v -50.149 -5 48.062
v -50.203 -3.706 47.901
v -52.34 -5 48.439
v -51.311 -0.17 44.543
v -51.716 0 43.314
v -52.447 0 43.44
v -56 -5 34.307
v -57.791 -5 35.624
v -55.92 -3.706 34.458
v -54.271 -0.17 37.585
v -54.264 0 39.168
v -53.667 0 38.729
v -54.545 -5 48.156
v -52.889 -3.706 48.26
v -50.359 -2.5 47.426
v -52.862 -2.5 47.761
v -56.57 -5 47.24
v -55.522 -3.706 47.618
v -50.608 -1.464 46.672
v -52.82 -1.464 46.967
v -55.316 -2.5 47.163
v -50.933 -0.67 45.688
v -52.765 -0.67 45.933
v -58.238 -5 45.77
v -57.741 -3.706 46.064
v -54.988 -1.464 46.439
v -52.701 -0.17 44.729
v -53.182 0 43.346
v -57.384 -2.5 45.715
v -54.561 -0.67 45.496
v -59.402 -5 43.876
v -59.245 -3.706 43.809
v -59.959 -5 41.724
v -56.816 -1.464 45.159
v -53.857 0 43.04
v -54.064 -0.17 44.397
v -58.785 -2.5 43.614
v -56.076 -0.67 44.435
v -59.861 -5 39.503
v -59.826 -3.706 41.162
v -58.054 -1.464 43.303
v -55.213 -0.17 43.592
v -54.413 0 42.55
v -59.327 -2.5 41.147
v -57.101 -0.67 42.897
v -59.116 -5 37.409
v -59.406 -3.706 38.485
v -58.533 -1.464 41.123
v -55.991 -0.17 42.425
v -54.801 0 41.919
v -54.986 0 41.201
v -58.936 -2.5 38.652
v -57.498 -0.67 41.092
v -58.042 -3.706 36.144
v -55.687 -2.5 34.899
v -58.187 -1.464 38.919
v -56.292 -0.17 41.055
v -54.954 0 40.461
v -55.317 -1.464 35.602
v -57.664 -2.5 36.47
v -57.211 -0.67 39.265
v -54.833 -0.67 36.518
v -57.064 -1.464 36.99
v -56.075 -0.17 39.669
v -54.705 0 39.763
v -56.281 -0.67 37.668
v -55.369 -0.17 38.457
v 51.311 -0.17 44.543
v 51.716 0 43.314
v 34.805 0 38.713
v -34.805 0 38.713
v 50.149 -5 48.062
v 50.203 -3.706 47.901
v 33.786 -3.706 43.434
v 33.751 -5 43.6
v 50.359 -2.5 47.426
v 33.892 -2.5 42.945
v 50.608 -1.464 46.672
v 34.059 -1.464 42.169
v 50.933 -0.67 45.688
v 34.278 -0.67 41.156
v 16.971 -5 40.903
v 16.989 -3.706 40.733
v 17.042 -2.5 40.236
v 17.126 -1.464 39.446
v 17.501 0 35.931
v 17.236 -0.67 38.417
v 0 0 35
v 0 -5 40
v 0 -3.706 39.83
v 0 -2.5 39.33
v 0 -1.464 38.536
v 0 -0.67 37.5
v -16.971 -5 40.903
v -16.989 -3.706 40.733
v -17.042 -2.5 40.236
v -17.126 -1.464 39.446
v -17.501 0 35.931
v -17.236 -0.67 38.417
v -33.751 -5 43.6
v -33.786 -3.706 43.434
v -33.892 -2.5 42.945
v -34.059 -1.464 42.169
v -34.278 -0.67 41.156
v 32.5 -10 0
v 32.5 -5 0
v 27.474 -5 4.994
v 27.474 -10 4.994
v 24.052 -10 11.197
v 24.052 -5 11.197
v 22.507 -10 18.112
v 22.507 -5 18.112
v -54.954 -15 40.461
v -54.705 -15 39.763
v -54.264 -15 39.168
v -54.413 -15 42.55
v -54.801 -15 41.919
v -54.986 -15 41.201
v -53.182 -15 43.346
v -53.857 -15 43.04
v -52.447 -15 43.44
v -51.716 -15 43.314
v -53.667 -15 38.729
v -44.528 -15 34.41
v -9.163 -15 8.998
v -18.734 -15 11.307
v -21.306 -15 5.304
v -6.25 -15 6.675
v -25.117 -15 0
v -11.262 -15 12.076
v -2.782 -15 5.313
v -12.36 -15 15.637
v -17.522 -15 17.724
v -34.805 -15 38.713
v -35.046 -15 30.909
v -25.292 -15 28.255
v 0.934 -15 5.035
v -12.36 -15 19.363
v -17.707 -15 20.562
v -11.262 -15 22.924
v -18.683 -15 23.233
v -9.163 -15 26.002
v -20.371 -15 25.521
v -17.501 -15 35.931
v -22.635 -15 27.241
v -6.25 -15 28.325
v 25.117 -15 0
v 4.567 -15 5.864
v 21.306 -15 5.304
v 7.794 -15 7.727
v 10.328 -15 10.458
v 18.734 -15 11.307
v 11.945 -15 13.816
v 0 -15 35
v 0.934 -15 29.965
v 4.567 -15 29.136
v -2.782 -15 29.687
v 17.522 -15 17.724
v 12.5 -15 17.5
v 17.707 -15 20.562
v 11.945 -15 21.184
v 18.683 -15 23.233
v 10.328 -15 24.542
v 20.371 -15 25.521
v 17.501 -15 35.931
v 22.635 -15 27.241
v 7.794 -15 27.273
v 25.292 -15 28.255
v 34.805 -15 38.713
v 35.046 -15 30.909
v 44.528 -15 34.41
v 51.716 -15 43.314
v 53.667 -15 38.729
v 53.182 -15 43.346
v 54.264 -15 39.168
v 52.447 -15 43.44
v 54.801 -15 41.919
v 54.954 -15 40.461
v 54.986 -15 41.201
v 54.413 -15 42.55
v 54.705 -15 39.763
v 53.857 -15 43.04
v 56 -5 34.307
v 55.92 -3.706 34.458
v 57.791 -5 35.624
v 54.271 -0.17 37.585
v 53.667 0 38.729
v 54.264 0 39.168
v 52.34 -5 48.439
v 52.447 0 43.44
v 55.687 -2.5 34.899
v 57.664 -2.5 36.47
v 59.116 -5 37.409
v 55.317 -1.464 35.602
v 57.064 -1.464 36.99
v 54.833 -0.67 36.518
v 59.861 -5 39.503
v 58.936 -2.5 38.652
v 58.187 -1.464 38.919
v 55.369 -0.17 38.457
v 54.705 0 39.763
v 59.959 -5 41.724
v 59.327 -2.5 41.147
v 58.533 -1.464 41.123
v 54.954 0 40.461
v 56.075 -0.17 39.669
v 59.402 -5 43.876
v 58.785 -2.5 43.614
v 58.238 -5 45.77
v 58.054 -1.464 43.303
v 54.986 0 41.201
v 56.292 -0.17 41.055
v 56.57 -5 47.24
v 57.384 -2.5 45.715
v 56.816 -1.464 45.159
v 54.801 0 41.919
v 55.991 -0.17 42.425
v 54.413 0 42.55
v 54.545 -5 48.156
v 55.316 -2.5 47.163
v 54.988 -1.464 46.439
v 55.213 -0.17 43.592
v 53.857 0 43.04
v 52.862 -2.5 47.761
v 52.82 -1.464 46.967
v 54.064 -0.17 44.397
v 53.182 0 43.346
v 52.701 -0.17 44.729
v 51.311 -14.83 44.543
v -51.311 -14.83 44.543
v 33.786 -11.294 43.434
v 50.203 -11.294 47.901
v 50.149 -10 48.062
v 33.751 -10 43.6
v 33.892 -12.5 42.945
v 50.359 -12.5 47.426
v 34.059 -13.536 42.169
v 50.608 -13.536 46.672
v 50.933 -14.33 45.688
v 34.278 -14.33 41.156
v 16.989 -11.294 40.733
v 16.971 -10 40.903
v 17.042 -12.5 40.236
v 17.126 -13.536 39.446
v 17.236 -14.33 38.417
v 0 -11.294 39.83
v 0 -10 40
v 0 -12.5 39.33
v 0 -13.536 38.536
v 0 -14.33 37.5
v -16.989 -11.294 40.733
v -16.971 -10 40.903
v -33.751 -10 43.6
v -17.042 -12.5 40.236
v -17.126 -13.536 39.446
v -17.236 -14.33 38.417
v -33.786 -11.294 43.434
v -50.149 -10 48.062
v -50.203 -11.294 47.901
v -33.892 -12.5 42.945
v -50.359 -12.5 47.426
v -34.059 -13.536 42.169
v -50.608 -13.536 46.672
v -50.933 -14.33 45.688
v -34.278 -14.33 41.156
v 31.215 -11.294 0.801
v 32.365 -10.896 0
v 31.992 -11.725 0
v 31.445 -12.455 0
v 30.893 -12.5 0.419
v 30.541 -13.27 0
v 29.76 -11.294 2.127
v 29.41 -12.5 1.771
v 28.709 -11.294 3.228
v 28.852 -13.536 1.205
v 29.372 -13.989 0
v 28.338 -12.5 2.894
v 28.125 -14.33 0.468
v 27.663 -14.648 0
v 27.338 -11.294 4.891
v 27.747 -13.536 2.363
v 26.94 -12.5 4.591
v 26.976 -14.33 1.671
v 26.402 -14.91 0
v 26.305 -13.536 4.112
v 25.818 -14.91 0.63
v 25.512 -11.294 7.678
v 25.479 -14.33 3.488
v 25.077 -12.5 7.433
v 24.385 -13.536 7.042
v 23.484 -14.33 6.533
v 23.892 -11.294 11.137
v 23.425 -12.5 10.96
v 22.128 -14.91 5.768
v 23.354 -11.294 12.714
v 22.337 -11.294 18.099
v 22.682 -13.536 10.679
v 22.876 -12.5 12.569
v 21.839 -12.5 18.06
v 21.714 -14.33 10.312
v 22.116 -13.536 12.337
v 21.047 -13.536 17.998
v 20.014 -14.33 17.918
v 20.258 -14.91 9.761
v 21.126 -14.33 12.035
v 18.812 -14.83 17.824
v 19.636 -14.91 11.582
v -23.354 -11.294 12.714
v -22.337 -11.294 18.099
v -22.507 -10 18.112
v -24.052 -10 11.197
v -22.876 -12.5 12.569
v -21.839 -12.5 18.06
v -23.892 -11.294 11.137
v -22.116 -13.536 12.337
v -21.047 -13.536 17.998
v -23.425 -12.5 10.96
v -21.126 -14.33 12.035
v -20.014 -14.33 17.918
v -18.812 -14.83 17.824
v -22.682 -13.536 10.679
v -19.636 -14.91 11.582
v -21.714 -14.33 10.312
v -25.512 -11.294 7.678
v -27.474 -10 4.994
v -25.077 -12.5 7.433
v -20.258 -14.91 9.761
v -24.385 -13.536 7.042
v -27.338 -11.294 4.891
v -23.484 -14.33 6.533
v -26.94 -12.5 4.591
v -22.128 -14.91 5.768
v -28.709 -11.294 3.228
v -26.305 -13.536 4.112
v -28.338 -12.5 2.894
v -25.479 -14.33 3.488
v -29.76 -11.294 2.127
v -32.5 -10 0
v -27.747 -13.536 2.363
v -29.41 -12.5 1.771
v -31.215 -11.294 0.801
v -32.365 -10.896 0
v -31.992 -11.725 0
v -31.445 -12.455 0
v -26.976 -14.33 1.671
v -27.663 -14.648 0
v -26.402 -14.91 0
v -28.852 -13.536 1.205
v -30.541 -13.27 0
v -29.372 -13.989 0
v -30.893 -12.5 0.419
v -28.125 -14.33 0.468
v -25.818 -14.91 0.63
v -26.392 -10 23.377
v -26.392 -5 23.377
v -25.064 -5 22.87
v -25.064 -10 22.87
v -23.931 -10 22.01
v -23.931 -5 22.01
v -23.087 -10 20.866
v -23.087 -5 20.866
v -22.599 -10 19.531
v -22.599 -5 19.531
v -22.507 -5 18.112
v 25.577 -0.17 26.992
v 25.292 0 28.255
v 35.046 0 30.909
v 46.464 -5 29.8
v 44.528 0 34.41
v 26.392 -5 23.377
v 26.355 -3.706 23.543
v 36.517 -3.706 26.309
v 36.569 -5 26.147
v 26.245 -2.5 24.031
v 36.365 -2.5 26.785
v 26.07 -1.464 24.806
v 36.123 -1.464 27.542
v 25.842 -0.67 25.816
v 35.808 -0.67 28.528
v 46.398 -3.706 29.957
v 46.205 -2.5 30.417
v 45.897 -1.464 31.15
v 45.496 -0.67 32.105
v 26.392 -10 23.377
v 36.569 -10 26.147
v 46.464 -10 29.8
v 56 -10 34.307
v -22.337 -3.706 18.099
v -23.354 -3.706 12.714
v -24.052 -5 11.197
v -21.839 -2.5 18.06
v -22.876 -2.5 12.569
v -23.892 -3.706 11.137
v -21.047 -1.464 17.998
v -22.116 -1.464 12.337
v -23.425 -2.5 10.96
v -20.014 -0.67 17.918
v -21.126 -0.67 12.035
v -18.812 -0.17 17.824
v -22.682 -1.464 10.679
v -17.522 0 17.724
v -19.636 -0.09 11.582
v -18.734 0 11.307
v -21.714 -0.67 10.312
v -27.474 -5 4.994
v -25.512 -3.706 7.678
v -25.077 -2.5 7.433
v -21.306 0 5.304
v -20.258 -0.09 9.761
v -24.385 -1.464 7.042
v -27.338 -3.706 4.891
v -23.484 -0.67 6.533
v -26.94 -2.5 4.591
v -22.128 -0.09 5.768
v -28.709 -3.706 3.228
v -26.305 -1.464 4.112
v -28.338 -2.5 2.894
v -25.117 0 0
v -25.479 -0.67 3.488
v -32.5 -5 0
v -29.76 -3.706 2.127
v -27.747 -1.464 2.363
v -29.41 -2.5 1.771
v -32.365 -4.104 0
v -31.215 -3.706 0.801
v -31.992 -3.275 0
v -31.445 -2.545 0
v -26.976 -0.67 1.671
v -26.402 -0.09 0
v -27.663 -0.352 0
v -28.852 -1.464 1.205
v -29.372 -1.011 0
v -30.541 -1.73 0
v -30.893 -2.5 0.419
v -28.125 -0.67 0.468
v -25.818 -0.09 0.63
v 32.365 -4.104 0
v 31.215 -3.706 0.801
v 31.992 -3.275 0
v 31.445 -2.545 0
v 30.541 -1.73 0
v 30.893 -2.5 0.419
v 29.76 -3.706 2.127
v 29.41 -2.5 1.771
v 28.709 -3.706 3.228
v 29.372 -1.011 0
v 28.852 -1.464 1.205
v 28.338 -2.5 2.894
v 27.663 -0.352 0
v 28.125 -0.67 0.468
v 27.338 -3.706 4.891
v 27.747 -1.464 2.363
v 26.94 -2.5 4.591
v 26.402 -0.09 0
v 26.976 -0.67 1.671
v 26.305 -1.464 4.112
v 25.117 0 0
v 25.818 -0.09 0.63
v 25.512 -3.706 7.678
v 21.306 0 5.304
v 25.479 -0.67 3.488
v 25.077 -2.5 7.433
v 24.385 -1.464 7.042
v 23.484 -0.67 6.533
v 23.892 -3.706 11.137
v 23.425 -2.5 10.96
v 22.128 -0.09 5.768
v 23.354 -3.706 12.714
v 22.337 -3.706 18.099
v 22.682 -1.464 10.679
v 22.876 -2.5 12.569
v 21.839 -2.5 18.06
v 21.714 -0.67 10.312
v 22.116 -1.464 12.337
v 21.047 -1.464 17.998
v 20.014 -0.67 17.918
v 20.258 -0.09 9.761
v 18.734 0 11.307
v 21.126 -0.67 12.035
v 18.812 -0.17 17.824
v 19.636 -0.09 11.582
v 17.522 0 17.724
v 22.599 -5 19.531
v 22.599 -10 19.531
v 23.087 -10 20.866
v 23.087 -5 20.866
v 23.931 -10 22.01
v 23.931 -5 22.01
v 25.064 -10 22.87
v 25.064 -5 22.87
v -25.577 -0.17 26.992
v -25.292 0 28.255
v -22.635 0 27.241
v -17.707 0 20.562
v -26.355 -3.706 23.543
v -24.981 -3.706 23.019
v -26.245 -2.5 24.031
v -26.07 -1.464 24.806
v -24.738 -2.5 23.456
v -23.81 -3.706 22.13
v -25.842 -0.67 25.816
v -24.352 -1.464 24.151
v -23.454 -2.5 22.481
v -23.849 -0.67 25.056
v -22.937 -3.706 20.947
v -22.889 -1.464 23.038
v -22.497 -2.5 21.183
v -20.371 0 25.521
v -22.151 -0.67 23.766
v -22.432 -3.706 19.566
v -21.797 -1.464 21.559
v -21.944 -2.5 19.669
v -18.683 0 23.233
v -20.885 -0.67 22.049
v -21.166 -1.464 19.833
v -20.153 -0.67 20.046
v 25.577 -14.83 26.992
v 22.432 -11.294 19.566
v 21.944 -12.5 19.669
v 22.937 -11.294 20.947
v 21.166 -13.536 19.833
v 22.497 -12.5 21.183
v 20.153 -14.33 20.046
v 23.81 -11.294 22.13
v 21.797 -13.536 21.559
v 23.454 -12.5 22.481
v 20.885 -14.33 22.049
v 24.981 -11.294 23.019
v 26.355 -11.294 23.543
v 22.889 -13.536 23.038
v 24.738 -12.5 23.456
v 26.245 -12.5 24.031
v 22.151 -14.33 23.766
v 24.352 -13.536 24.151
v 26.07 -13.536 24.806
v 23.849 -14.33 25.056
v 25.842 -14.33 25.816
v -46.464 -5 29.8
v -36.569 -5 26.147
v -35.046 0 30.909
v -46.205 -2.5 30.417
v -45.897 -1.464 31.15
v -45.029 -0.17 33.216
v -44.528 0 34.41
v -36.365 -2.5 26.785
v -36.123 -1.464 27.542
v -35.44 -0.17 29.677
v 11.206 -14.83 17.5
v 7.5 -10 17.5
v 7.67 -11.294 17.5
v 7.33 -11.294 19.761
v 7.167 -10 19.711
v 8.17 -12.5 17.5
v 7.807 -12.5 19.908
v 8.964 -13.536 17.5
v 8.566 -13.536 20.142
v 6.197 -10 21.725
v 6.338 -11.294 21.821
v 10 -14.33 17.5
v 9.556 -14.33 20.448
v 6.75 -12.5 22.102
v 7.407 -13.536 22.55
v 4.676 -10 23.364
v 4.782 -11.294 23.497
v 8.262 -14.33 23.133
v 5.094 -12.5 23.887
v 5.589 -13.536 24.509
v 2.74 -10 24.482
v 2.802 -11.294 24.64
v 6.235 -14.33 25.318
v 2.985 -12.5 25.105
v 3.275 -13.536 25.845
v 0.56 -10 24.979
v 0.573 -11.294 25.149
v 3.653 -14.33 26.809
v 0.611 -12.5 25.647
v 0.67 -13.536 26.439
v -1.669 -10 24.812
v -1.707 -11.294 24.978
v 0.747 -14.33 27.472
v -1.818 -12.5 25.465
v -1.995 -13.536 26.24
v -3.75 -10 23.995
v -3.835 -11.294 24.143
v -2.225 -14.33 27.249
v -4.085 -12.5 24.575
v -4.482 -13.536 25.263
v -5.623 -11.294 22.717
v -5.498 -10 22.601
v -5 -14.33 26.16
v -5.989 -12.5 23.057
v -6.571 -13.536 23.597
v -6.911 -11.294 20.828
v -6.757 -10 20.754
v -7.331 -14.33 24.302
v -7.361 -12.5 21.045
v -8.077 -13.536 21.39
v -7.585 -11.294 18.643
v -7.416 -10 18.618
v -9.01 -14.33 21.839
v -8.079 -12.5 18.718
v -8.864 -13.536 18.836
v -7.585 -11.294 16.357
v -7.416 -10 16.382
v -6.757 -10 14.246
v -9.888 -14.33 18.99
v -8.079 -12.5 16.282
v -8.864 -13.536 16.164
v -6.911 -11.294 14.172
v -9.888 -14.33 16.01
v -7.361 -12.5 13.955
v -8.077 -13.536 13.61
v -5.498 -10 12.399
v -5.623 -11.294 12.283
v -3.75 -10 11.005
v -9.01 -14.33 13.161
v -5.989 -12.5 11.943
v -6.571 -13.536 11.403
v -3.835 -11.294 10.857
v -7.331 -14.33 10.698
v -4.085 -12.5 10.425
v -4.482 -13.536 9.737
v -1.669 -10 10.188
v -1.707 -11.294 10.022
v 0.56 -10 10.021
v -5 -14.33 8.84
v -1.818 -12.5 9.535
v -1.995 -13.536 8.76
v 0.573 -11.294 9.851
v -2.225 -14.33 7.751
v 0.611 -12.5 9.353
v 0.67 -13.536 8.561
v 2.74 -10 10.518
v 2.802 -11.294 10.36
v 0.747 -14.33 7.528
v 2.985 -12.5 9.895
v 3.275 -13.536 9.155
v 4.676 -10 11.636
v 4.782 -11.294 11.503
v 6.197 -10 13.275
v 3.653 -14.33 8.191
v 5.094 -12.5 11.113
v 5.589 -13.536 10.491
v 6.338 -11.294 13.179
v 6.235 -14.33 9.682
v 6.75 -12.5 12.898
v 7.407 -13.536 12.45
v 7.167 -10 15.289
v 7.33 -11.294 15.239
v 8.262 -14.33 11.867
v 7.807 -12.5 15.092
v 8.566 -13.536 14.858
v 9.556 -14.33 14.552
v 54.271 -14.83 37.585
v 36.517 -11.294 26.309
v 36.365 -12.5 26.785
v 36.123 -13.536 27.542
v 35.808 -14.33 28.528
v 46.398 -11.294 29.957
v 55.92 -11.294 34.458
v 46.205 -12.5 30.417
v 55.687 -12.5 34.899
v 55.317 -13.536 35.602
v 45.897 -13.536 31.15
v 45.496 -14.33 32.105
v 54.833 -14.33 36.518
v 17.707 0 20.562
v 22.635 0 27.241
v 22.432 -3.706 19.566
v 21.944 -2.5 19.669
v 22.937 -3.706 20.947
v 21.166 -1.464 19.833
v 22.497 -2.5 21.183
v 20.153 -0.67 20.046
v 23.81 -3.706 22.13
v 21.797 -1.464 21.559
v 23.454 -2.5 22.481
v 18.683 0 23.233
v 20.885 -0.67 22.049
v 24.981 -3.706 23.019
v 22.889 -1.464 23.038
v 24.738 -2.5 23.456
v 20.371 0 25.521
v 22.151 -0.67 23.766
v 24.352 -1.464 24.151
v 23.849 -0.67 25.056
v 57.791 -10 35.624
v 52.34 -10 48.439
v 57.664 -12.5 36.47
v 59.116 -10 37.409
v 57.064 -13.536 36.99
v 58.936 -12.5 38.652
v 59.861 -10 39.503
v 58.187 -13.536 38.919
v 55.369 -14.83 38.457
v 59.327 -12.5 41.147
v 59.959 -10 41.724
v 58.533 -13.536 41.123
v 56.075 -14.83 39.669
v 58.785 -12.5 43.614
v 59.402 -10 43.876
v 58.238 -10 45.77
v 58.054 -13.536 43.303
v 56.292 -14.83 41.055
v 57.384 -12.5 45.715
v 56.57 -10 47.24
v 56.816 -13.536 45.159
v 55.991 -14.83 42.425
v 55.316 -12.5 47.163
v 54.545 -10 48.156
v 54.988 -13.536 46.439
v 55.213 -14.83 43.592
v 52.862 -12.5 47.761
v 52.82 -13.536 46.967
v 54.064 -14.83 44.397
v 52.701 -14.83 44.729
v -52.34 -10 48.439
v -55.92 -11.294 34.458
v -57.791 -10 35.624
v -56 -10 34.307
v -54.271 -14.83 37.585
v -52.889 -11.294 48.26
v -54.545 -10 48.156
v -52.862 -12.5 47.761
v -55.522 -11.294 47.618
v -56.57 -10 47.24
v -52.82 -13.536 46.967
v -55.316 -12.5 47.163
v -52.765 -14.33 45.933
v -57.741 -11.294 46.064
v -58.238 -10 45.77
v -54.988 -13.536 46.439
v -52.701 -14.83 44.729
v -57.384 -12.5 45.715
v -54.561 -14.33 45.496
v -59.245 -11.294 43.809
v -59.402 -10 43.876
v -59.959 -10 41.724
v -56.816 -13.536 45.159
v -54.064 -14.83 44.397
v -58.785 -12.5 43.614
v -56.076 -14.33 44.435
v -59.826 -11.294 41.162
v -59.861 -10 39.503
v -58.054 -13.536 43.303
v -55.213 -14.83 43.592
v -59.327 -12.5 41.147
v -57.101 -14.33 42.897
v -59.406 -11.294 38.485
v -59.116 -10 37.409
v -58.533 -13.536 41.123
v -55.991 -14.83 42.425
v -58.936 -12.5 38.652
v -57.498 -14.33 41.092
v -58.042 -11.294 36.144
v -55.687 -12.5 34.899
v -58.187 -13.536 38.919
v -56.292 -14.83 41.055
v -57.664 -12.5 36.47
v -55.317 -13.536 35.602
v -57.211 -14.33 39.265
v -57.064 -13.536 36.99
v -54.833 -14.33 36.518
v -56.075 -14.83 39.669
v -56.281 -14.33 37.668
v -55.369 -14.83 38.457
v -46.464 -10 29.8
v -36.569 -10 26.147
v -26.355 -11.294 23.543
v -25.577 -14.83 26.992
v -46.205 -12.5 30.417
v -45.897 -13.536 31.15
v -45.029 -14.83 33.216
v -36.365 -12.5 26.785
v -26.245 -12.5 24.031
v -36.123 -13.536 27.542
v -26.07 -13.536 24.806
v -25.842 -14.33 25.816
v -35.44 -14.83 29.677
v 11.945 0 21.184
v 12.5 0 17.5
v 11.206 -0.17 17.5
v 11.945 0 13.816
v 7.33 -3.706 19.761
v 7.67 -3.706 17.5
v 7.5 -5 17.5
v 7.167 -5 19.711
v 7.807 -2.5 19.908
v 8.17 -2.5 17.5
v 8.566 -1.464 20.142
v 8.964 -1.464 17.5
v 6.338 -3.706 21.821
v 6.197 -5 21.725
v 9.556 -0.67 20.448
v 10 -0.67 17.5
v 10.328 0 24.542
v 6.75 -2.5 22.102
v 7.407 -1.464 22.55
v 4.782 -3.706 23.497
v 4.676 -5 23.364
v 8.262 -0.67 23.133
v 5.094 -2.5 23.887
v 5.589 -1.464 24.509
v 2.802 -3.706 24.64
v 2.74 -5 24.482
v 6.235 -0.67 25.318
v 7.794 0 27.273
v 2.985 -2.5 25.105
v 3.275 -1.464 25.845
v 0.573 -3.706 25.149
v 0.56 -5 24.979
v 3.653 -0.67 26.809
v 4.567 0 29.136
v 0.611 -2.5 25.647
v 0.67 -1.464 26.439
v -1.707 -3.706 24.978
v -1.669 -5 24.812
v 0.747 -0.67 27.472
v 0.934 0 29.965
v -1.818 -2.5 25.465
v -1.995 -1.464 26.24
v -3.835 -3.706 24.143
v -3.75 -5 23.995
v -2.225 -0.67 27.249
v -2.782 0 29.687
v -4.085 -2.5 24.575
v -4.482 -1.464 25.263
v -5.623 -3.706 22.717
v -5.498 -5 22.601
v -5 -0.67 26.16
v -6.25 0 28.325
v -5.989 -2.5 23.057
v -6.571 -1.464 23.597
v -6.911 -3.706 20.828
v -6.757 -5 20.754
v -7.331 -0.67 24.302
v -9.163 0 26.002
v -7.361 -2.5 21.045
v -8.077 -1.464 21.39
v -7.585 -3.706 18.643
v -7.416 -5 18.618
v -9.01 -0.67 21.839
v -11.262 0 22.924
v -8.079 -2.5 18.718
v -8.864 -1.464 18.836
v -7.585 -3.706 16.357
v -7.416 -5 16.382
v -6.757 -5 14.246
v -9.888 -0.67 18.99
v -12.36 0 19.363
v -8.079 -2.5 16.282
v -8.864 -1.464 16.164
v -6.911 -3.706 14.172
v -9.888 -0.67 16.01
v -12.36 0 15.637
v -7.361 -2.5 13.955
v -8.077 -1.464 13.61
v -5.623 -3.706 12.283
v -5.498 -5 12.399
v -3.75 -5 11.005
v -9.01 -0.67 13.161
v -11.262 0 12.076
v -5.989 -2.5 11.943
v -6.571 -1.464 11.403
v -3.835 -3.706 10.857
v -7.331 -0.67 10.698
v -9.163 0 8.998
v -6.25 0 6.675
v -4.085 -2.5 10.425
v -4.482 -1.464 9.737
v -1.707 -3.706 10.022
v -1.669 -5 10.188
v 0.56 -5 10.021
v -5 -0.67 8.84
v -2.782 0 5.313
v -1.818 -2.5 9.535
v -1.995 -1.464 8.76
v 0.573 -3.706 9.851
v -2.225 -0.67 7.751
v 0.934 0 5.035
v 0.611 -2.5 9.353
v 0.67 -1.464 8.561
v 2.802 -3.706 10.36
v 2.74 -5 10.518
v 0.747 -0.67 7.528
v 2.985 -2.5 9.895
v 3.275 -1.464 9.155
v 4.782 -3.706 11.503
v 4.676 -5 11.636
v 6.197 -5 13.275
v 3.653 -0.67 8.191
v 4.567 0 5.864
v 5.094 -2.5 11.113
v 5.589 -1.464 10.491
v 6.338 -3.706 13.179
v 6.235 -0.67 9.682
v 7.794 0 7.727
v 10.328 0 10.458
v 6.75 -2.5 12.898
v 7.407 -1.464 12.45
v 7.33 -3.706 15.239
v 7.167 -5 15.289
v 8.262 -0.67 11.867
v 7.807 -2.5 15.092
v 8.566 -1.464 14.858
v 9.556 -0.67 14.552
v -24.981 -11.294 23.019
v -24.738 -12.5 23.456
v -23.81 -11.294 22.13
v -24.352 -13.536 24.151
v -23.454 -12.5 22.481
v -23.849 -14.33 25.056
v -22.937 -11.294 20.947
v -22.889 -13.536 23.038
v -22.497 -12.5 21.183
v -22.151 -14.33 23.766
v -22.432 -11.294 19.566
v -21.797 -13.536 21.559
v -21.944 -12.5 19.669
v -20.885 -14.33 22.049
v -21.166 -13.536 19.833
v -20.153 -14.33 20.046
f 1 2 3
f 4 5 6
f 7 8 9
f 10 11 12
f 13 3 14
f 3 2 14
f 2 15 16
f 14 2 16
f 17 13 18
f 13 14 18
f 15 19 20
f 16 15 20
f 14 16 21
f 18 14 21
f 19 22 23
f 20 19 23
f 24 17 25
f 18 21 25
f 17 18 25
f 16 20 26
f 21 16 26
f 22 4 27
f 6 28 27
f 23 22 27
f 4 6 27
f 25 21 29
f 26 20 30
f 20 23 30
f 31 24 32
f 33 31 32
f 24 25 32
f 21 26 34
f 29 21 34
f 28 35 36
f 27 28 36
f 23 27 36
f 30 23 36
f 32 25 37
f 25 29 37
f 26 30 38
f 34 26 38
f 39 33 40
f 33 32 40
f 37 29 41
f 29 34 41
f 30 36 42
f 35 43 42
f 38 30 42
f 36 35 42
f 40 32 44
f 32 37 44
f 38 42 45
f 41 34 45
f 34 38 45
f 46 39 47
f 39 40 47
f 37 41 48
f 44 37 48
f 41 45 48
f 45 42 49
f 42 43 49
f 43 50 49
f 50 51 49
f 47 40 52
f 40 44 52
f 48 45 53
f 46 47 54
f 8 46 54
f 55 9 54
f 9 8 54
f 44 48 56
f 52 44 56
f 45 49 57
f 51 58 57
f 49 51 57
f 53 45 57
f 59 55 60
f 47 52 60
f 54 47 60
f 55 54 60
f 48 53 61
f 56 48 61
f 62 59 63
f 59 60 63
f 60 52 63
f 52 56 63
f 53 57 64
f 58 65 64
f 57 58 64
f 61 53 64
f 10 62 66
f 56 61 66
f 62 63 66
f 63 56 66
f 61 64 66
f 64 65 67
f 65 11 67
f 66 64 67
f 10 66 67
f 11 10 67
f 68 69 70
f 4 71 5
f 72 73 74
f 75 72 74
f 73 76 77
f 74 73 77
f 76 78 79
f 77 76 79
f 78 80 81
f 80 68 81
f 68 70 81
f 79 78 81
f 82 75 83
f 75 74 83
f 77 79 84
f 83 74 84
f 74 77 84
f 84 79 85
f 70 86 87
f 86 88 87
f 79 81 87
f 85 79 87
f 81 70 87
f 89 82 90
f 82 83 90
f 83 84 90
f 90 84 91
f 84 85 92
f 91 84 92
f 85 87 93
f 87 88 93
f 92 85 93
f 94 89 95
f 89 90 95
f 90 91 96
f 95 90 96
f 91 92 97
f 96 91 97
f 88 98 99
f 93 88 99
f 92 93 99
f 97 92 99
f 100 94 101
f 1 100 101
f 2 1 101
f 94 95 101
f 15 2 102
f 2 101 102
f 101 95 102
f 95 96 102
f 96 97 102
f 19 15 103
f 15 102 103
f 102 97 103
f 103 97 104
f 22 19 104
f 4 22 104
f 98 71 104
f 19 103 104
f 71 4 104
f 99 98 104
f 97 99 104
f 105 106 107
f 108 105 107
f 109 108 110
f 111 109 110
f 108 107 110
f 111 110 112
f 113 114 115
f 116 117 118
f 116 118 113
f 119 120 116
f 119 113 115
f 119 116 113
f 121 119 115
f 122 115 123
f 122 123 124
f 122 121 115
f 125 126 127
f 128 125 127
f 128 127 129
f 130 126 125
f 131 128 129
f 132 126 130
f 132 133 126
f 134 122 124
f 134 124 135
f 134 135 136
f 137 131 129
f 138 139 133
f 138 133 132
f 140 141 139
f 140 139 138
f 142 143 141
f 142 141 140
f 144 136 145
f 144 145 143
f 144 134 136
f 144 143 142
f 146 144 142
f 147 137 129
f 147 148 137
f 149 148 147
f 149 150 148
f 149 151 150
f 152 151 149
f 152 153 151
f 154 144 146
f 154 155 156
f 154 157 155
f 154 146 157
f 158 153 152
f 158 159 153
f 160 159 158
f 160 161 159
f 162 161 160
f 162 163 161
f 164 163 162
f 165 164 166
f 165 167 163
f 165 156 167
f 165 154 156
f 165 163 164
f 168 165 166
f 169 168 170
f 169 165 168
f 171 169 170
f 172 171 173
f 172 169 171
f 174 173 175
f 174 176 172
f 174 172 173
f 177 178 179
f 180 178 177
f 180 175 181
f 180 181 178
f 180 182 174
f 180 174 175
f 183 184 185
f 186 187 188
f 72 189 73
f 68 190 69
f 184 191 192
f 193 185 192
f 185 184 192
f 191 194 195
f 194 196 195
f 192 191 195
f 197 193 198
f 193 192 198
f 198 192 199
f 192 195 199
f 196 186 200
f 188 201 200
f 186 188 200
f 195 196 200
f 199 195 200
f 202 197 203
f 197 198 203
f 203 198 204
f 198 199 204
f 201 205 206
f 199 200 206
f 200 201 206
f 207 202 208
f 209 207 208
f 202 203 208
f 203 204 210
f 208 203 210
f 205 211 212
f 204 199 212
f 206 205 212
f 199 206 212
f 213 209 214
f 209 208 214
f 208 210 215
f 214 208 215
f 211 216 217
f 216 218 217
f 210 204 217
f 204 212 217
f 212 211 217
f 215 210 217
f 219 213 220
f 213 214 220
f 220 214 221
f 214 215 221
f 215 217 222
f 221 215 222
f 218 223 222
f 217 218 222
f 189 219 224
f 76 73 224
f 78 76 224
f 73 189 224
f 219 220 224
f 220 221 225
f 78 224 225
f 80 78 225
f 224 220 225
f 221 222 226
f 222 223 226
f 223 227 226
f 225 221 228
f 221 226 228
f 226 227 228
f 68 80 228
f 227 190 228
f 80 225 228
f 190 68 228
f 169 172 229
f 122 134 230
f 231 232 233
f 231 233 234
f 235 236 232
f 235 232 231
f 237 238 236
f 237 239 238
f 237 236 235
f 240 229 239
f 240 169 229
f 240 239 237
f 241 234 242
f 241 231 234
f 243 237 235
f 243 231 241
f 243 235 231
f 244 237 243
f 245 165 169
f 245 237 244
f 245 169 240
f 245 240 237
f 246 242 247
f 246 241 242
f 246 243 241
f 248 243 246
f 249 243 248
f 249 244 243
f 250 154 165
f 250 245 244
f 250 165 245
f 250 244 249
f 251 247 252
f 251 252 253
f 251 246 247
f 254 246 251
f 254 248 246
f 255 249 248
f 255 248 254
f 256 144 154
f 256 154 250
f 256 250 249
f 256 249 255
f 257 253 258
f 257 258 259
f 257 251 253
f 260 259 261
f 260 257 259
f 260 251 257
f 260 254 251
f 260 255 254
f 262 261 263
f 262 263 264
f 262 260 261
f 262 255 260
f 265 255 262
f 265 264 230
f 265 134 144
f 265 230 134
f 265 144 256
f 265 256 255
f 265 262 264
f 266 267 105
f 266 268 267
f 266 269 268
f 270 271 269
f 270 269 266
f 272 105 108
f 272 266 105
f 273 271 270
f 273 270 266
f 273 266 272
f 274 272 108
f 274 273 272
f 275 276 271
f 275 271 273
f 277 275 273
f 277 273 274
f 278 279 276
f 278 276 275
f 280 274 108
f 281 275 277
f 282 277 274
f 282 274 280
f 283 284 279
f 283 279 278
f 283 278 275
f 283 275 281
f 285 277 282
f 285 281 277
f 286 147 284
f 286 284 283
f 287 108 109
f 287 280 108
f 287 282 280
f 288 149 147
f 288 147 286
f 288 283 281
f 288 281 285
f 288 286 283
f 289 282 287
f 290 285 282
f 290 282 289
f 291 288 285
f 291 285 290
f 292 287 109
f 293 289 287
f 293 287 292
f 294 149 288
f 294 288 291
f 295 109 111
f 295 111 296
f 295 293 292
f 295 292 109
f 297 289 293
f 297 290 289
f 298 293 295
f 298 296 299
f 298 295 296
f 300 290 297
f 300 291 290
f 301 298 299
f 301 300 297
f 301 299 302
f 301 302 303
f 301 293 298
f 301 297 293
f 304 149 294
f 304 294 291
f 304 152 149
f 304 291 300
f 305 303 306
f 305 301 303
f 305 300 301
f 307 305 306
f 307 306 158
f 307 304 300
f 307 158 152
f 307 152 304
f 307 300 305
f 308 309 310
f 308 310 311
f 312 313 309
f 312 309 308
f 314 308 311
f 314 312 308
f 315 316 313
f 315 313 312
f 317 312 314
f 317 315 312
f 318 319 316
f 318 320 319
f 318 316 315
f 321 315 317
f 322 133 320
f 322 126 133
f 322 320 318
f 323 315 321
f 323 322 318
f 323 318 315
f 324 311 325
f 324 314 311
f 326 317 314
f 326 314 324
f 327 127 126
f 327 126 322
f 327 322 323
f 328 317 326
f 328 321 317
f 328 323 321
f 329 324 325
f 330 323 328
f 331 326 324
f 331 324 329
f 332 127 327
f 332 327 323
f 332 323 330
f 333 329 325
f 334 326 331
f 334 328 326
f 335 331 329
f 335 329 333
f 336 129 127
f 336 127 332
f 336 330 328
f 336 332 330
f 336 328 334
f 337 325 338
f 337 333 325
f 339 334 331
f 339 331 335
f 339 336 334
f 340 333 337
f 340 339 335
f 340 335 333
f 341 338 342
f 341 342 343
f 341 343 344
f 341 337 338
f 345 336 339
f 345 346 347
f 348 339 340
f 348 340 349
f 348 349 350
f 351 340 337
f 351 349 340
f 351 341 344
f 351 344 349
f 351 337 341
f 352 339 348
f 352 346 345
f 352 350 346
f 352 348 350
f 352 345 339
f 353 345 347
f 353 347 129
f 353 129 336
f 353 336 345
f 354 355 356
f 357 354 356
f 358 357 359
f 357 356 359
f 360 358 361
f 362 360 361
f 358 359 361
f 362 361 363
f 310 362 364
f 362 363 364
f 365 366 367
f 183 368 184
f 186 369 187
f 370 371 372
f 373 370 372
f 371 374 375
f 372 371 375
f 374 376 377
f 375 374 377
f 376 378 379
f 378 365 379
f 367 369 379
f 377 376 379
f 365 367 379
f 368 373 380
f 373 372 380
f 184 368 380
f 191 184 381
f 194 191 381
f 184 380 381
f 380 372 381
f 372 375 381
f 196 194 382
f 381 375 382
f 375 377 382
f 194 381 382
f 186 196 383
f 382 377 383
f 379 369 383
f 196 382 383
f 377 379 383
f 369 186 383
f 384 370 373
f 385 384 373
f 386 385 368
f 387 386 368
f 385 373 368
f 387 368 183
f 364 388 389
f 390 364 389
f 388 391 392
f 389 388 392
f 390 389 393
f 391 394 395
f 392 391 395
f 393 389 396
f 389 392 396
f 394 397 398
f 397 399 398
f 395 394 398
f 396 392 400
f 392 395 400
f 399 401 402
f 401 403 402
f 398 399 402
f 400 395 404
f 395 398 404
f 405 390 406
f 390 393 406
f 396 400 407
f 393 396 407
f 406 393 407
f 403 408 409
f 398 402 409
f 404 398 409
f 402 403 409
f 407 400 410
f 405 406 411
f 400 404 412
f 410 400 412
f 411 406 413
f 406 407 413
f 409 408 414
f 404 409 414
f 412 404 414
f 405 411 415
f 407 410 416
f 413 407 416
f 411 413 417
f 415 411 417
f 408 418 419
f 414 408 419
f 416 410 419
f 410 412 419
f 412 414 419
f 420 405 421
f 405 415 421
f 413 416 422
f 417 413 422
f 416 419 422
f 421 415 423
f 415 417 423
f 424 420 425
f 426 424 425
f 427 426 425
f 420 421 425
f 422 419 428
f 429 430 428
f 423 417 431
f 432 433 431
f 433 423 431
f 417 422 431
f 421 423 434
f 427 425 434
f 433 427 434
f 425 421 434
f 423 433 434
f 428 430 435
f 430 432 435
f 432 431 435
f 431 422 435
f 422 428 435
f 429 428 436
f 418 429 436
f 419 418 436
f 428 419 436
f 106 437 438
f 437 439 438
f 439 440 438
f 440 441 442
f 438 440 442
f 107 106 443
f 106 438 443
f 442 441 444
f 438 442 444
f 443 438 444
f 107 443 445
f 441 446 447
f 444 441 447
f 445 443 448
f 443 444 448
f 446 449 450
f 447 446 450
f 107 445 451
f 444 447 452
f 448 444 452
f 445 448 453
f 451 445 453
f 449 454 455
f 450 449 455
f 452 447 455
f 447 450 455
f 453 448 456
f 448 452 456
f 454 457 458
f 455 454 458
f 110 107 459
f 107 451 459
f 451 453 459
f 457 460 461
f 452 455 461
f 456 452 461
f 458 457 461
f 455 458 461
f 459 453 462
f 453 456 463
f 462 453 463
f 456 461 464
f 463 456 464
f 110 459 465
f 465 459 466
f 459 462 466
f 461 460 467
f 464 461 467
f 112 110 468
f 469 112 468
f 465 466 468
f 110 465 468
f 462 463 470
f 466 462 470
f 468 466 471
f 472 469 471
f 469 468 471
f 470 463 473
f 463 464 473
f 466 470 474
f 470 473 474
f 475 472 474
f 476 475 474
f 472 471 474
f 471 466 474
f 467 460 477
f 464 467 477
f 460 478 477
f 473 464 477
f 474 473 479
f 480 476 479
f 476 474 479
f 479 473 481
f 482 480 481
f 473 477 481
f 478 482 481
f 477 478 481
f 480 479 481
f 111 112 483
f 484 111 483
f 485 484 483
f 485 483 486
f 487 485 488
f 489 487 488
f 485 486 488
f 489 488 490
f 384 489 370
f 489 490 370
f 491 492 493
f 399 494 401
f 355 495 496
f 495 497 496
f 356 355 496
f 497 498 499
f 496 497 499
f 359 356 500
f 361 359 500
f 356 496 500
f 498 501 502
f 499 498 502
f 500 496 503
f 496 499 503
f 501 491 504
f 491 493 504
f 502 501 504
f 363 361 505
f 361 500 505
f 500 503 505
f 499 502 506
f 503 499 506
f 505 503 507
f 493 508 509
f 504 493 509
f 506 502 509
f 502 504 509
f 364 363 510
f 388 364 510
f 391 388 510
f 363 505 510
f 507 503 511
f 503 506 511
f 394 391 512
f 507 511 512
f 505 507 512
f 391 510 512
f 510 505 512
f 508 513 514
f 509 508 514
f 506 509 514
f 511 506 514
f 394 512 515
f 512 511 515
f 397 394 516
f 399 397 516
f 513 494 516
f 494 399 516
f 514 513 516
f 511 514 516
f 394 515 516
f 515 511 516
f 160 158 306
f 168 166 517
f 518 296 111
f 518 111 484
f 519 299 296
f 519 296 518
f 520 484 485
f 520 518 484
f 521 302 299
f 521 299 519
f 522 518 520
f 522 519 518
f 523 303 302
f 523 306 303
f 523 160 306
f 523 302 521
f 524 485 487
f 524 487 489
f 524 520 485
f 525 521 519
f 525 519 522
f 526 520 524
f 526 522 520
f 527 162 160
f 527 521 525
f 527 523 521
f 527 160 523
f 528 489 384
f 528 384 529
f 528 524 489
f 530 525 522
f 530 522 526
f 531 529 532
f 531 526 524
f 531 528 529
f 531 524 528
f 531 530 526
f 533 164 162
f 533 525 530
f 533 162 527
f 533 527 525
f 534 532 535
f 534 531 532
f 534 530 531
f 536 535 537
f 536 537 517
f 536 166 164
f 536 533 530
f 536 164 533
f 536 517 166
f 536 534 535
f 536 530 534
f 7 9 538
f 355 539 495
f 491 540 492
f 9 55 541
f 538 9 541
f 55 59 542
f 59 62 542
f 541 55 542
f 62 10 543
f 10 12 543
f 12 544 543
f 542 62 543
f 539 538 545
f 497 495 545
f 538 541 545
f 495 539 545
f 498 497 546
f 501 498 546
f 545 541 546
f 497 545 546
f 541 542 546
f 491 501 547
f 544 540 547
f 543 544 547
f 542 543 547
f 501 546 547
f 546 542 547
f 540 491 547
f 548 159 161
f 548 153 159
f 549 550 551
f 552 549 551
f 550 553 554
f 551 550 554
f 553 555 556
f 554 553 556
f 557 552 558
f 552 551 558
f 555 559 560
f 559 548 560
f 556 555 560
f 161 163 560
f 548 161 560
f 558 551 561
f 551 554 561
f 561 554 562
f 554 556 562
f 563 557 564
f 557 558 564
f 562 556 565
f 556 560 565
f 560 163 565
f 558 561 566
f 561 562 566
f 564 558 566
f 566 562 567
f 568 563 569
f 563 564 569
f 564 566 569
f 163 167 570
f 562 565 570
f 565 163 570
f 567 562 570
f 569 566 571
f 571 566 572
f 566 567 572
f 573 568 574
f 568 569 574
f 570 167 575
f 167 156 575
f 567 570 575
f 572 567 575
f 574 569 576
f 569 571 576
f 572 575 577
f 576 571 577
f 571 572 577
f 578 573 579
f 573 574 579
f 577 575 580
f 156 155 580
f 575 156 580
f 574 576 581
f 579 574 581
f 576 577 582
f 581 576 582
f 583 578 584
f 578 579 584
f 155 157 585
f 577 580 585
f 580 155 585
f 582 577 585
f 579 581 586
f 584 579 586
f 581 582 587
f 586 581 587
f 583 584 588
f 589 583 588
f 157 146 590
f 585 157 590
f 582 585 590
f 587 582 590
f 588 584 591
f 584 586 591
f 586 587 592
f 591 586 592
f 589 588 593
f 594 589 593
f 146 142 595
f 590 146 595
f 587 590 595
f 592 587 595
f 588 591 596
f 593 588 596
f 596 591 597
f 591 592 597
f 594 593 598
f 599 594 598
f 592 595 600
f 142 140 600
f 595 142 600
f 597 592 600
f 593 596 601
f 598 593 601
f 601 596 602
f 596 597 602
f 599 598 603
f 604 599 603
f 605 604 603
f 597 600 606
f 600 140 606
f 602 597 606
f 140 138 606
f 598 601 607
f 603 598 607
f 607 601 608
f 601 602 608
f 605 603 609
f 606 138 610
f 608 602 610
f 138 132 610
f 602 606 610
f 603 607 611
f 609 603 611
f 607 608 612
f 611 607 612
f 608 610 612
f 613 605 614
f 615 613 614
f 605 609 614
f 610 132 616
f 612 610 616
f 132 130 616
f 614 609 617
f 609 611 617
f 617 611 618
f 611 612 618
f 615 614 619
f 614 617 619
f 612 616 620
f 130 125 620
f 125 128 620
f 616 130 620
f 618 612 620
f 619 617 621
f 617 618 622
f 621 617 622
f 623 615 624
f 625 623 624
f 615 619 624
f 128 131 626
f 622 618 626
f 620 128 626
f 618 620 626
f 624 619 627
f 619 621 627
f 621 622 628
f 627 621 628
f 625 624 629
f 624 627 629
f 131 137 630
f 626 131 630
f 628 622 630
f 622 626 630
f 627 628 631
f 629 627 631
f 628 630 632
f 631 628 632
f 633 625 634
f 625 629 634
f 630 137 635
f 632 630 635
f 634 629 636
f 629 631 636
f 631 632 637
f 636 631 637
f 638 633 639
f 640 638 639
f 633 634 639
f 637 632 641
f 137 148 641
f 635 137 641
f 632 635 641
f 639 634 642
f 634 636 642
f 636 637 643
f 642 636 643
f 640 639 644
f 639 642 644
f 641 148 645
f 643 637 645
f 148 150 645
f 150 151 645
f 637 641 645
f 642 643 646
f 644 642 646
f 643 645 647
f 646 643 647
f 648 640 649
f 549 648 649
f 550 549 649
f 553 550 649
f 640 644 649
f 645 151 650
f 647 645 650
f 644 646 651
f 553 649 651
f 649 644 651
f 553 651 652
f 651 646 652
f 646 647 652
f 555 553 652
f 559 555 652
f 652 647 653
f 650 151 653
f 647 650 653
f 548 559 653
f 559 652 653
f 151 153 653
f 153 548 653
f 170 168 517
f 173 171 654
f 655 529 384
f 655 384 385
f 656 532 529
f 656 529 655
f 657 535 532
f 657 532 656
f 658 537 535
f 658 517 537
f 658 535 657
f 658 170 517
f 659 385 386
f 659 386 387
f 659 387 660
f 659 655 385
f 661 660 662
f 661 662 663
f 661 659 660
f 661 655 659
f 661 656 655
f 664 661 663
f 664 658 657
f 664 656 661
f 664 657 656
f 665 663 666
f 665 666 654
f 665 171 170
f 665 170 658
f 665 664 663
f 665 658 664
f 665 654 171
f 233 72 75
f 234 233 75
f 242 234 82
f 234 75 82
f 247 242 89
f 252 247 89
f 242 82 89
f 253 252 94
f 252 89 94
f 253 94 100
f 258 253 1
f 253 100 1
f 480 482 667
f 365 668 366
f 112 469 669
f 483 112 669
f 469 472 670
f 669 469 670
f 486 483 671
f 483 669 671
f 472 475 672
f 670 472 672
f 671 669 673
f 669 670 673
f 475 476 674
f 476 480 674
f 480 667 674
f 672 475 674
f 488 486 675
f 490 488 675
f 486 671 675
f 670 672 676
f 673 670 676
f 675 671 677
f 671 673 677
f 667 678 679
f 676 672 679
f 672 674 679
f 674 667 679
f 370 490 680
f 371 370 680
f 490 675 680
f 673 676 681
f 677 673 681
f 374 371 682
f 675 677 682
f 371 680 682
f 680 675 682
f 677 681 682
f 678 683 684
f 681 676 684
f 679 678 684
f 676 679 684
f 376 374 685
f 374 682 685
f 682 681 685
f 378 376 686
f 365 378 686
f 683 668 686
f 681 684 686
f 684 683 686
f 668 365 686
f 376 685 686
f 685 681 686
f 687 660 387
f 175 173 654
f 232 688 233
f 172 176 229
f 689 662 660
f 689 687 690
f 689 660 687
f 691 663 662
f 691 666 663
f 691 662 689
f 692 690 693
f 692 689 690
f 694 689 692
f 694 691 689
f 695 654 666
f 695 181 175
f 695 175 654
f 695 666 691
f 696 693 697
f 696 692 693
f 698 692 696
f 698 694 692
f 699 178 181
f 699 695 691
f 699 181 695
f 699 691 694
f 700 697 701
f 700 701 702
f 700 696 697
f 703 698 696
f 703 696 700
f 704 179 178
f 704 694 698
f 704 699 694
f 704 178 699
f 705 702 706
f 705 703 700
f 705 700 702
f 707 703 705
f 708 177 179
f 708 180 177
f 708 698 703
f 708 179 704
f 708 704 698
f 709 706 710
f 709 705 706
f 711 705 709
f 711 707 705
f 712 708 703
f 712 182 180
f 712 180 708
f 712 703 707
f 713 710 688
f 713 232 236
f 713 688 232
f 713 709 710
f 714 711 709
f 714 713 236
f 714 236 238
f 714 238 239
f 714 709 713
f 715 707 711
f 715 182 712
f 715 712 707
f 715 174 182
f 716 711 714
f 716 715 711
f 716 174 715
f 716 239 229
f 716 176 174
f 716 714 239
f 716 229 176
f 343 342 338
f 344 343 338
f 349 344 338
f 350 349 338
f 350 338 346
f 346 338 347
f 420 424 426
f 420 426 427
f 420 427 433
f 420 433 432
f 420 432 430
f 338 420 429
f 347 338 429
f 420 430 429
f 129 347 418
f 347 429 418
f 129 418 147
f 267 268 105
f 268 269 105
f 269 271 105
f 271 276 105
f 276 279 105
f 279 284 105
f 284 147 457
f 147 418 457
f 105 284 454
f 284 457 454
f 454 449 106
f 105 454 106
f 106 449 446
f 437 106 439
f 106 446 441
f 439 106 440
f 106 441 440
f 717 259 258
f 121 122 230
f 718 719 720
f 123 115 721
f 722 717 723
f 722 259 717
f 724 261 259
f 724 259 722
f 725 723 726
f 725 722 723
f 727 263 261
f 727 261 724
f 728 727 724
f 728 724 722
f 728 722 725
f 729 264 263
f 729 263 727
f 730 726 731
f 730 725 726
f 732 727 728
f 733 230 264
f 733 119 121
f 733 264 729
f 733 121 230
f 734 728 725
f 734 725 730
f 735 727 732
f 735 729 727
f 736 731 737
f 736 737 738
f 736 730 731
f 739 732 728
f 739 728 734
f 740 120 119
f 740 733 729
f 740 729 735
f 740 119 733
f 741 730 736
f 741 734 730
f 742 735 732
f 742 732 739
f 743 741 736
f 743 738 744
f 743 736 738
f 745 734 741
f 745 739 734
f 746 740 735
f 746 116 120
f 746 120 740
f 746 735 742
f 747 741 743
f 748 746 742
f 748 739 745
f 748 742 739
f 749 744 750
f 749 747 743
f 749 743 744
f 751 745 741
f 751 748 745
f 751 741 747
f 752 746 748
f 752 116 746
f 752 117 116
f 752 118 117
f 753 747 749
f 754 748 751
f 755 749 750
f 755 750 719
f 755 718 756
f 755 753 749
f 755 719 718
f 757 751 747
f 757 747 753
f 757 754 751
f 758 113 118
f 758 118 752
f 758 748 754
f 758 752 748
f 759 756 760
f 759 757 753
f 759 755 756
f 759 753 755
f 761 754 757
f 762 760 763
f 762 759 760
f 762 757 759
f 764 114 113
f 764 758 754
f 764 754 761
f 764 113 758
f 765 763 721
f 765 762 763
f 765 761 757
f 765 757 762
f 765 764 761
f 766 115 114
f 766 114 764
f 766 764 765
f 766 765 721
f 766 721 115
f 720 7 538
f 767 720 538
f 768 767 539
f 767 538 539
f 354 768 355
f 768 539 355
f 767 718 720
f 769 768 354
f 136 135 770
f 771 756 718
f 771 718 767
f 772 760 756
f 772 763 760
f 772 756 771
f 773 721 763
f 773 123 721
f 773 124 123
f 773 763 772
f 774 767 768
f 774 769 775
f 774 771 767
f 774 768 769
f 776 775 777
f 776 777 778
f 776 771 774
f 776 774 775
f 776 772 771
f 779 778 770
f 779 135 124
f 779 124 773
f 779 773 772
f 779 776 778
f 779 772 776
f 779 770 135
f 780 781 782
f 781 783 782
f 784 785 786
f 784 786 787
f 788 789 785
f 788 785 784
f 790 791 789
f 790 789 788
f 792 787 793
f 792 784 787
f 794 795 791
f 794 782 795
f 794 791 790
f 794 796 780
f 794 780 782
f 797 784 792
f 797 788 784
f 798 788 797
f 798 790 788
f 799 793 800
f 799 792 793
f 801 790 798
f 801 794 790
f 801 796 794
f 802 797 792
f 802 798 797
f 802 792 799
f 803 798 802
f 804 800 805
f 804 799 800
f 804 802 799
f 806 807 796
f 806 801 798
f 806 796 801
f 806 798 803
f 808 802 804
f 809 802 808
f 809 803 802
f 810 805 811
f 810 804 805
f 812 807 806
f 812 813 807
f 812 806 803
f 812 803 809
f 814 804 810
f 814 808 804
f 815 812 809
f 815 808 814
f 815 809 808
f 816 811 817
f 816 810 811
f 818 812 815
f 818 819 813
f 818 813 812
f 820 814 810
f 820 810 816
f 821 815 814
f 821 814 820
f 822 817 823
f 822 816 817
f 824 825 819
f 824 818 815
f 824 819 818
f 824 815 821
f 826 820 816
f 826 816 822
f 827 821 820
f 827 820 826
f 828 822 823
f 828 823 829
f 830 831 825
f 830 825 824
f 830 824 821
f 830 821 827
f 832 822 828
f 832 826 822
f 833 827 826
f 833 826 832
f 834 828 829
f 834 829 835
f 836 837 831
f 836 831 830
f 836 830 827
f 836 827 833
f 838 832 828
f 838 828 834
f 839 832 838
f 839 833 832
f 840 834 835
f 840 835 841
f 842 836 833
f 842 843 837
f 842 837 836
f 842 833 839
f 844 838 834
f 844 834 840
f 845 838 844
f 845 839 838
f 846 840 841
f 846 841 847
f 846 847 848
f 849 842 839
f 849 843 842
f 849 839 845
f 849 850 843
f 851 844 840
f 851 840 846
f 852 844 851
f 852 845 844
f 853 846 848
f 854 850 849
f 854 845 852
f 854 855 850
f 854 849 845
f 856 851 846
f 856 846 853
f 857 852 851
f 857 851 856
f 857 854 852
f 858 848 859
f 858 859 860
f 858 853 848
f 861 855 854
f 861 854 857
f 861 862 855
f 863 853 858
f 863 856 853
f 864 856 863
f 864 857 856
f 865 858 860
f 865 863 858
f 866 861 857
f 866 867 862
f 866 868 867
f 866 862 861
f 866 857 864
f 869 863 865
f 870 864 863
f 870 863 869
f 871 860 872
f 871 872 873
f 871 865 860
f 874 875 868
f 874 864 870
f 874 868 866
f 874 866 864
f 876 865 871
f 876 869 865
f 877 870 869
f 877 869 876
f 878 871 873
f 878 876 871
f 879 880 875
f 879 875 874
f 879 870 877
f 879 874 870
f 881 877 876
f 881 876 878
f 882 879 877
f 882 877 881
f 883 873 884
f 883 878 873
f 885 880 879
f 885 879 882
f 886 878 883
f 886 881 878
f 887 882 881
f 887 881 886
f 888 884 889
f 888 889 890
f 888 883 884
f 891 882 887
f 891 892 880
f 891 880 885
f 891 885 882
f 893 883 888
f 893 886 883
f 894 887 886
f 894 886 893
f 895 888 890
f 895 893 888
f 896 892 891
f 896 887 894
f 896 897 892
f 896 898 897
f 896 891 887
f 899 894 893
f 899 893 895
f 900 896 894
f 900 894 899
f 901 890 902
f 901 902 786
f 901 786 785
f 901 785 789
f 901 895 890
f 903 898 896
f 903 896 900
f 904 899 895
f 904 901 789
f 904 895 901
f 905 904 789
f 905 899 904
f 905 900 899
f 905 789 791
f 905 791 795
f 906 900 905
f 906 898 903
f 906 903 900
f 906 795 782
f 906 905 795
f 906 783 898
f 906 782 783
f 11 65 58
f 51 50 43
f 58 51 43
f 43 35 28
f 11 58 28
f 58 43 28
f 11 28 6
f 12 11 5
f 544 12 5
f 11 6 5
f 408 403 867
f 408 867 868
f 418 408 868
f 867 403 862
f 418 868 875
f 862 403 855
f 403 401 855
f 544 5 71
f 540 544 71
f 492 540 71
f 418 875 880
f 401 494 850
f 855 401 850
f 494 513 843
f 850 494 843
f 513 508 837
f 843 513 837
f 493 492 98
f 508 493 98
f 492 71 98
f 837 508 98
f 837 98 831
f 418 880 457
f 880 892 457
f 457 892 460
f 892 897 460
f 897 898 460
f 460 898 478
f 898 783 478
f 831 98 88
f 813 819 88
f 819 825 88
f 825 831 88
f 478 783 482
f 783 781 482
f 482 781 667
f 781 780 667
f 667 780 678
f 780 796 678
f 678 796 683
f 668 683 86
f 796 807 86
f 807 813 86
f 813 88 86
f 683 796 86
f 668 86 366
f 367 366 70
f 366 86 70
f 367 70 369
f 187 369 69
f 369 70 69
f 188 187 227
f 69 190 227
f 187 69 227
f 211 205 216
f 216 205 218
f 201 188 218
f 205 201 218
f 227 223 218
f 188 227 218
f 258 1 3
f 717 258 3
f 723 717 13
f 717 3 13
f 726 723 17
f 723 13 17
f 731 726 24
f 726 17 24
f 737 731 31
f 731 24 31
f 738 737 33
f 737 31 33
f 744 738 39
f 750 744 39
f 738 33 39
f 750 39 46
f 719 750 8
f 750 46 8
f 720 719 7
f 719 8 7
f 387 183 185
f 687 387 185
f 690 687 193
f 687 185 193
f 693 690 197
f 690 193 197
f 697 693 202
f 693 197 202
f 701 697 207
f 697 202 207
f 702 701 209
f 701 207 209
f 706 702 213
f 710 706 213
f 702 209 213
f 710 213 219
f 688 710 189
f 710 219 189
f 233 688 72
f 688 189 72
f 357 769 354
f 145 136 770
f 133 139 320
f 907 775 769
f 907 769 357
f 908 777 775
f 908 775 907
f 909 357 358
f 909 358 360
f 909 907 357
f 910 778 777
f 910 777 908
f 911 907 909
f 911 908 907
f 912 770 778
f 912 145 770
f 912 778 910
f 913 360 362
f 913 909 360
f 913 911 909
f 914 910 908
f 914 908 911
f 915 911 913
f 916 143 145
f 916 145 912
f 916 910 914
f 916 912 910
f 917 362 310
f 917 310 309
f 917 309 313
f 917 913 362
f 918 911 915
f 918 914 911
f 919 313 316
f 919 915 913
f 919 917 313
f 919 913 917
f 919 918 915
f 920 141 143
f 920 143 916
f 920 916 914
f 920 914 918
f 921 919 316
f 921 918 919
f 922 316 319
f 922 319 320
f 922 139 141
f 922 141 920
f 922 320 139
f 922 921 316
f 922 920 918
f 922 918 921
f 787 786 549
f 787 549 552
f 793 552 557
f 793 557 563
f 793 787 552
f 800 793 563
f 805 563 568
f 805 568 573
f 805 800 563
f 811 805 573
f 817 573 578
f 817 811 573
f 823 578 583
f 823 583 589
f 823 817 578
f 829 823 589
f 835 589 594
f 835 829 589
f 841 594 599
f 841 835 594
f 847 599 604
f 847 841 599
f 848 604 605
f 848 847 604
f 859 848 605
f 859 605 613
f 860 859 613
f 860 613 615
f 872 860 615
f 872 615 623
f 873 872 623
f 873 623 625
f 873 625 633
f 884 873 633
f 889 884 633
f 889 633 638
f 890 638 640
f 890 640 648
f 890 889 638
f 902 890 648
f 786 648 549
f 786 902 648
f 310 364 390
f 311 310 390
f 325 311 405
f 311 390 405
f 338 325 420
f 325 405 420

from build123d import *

# Parameters (mm, degrees)
F0_R     = 7.5
F1_DEPTH = 15
F2_R     = 5


with BuildPart() as f1:
    # F0 (on Front) → F1 (new body)
    with BuildSketch(Plane.XZ):
        with BuildLine():
            ThreePointArc((50.149254, 48.062341), (0, 40), (-50.149254, 48.062341))
            ThreePointArc((-50.149254, 48.062341), (-59.401627, 43.875829), (-56, 34.307013))
            ThreePointArc((-56, 34.307013), (-41.556916, 27.864486), (-26.392044, 23.377228))
            ThreePointArc((-26.392044, 23.377228), (-23.46842, 21.468343), (-22.506782, 18.111757))
            ThreePointArc((-22.506782, 18.111757), (-25.542263, 7.97382), (-32.5, 0))
            Line((-32.5, 0), (32.5, 0))
            ThreePointArc((32.5, 0), (25.542263, 7.97382), (22.506782, 18.111757))
            ThreePointArc((22.506782, 18.111757), (23.46842, 21.468343), (26.392044, 23.377228))
            ThreePointArc((26.392044, 23.377228), (41.556916, 27.864486), (56, 34.307013))
            ThreePointArc((56, 34.307013), (59.401627, 43.875829), (50.149254, 48.062341))
        make_face()
        with Locations((0, 17.5)):
            Circle(F0_R, mode=Mode.SUBTRACT)
    extrude(amount=F1_DEPTH)

    # F2
    f2_edges = [f1.edges().sort_by_distance(p)[0] for p in [
        (0, -15, 40),
        (0, 0, 40),
        (-7.5, 0, 17.5),
        (-7.5, -15, 17.5),
    ]]
    fillet(f2_edges, radius=F2_R)


solid = f1.part
